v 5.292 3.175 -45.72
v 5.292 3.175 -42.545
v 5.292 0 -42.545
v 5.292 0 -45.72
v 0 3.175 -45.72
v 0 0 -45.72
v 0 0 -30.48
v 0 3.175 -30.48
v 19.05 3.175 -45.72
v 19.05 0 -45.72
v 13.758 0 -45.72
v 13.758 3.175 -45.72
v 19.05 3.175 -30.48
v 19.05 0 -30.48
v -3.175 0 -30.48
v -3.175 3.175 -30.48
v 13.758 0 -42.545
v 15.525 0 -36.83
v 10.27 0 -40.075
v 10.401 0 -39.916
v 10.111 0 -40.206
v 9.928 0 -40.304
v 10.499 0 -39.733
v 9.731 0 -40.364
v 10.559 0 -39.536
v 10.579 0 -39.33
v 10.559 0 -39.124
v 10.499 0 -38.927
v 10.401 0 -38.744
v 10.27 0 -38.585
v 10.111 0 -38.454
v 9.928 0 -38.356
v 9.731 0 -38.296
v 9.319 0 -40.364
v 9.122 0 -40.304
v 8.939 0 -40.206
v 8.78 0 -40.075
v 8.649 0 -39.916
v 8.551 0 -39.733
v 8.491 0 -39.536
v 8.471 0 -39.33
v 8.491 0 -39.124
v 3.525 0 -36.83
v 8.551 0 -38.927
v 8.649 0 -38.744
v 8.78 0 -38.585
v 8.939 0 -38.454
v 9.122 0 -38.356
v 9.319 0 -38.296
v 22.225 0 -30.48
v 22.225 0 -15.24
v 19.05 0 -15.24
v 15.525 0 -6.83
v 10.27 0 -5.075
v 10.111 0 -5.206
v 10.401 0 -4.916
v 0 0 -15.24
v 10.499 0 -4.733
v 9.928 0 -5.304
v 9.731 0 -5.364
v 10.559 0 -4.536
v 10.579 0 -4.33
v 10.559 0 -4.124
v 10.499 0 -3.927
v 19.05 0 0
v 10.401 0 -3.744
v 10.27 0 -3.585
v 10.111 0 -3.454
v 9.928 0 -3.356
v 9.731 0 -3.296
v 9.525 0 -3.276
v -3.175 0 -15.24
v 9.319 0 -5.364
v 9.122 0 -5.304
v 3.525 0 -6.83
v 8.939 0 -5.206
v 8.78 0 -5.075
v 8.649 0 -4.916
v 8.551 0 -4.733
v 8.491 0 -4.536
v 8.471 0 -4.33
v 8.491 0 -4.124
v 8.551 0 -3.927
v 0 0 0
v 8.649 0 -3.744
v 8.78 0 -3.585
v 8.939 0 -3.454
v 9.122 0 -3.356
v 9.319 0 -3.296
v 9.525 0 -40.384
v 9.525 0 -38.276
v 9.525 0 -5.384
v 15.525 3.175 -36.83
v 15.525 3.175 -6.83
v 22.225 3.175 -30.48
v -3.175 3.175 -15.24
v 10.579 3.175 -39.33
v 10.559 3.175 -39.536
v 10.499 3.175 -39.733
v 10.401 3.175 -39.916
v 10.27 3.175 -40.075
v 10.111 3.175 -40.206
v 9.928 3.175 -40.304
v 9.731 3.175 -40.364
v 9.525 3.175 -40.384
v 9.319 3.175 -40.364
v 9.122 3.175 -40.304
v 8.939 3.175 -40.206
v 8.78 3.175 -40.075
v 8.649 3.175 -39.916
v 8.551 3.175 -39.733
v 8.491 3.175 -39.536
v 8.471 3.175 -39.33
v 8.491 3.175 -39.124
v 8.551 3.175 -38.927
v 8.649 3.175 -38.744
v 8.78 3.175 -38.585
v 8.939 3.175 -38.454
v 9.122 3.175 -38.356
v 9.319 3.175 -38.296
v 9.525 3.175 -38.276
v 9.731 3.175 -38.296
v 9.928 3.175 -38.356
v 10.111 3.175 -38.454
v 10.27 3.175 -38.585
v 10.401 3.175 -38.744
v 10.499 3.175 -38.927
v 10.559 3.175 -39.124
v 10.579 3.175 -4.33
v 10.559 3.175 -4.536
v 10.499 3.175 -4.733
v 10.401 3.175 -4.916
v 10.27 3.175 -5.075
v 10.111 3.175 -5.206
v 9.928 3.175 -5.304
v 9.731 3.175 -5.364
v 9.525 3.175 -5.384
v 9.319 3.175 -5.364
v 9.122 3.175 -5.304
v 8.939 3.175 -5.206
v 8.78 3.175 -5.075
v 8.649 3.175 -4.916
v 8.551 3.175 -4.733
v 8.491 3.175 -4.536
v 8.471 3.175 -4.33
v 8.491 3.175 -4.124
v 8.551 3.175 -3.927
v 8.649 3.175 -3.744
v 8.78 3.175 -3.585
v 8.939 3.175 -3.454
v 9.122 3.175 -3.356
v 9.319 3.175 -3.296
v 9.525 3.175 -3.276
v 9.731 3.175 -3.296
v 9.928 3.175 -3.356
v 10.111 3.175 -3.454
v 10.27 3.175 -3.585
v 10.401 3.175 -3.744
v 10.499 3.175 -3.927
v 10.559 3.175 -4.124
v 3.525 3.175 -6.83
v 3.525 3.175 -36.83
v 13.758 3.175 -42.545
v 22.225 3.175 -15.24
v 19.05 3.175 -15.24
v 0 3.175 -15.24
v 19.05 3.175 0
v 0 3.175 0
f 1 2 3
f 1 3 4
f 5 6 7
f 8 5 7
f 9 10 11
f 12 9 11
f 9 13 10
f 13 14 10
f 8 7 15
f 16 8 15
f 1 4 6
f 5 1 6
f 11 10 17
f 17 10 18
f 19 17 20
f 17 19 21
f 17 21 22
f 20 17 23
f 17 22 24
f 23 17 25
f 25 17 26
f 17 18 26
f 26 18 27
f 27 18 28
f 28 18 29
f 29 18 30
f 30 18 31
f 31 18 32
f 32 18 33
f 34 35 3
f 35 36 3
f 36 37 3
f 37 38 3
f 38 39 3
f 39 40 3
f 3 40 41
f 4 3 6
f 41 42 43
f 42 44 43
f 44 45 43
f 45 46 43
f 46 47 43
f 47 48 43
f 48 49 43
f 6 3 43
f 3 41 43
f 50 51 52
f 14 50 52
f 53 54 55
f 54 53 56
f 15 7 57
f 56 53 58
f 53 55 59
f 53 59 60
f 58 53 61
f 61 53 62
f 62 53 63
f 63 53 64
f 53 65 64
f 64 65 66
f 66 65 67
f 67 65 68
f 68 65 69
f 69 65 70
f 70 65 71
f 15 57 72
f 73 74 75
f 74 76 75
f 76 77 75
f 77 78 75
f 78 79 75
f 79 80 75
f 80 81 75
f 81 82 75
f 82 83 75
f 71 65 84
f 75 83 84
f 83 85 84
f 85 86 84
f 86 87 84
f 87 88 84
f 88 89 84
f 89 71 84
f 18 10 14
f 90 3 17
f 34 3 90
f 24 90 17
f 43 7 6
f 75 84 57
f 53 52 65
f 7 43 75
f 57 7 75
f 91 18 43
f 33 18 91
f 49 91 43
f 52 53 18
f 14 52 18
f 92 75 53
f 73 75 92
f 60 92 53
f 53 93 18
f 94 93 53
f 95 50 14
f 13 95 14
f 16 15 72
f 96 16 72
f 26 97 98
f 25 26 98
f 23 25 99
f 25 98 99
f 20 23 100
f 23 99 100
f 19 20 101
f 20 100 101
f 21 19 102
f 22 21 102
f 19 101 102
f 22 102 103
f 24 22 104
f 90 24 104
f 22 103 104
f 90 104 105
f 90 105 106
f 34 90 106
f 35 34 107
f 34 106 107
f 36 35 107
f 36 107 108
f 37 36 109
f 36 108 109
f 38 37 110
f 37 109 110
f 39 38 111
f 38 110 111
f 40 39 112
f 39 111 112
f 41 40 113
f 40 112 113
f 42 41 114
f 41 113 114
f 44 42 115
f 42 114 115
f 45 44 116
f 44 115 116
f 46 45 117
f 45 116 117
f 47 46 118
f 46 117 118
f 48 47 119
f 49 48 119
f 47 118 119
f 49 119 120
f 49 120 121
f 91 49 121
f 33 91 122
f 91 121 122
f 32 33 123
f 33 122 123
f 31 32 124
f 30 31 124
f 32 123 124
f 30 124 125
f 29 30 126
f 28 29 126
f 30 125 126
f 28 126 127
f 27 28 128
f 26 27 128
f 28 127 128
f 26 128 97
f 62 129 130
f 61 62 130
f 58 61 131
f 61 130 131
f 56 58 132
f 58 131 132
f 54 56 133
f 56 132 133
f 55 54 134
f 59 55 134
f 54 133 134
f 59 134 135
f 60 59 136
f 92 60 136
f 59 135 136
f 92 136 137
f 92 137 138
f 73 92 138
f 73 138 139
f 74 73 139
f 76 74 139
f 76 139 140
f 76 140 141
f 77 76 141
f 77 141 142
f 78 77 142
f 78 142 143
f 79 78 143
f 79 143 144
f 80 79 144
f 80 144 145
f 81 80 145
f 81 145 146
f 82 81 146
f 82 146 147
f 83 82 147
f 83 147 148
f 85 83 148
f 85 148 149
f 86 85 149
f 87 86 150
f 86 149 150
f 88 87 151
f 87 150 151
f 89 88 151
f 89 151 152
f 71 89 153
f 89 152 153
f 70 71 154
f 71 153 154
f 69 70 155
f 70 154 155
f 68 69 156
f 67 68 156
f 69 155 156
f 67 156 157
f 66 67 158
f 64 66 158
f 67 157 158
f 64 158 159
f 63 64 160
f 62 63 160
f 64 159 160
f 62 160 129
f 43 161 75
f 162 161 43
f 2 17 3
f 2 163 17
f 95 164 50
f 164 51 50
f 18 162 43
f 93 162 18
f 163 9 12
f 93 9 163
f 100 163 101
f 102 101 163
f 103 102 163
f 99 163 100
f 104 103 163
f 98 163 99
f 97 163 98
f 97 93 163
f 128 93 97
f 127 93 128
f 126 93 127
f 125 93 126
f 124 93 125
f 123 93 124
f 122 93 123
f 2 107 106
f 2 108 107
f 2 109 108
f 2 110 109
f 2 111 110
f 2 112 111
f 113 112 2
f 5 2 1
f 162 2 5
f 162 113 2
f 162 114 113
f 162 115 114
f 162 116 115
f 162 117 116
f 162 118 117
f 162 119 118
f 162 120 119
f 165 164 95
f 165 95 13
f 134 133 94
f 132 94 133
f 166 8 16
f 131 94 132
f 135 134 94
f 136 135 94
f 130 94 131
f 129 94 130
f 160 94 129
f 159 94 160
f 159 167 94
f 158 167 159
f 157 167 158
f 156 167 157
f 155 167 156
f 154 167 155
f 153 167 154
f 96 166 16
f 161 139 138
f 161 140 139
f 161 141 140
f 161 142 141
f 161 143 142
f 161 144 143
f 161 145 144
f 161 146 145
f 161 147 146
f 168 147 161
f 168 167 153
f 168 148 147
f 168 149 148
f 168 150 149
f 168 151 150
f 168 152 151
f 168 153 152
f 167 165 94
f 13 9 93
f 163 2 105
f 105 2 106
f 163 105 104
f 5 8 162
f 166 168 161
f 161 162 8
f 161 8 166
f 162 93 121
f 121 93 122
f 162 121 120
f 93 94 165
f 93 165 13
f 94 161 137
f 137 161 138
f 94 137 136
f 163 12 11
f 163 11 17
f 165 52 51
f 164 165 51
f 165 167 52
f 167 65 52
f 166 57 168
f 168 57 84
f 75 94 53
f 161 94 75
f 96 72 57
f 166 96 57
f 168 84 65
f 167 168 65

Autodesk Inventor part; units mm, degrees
ref_plane "YZ Plane" through (0, 0, 0) normal (1, 0, 0) x (0, 1, 0)
ref_plane "XZ Plane" through (0, 0, 0) normal (0, 1, 0) x (-1, 0, 0)
ref_plane "XY Plane" through (0, 0, 0) normal (0, 0, 1) x (1, 0, 0)
sketch "Sketch1" plane through (0, 0, 0) normal (0, 1, 0) x (-1, 0, 0)
  line L0 (0, 0) -> (-19.05, 0)
  line L1 (-19.05, 0) -> (-19.05, -45.72)
  line L2 (-19.05, -45.72) -> (0, -45.72)
  line L3 (0, -45.72) -> (0, 0)
  line L4 (-19.05, -15.24) -> (-22.225, -15.24)
  line L5 (-22.225, -15.24) -> (-22.225, -30.48)
  line L6 (-22.225, -30.48) -> (-19.05, -30.48)
  line L7 (-19.05, -30.48) -> (-19.05, -15.24)
  line L8 (0, -30.48) -> (3.175, -30.48)
  line L9 (3.175, -30.48) -> (3.175, -15.24)
  line L10 (3.175, -15.24) -> (0, -15.24)
  line L11 (0, -15.24) -> (0, -30.48)
  dimension "d0" = 19.05
  dimension "d1" = 45.72
  dimension "d2" = 3.175
  dimension "d3" = 15.24
  dimension "d4" = 3.175
  dimension "d5" = 15.24
  dimension "d6" = 15.24
extrude "Extrusion1" add sketch "Sketch1" along normal blind 3.175
sketch "Sketch2" plane through (0, 3.175, 0) normal (0, 1, 0) x (1, 0, 0)
  line L0 (-3.175, 30.48) -> (-3.175, 15.24) projected
  line L1 (19.05, 45.72) -> (0, 45.72) projected
  line L2 (5.2917, 45.72) -> (13.7583, 45.72)
  line L3 (13.7583, 45.72) -> (13.7583, 42.545)
  line L4 (13.7583, 42.545) -> (5.2917, 42.545)
  line L5 (5.2917, 42.545) -> (5.2917, 45.72)
  dimension "d9" = 8.4667
  dimension "d10" = 3.175
  dimension "d11" = 8.4667
extrude "Extrusion2" cut sketch "Sketch2" against normal blind 3.175
sketch "Sketch3" plane through (0, 3.175, 0) normal (0, 1, 0) x (1, 0, 0)
  line L0 (-3.175, 30.48) -> (-3.175, 15.24) projected
  line L1 (19.05, 45.72) -> (13.7583, 45.72) projected
  line L2 (3.525, 36.83) -> (15.525, 36.83)
  line L3 (15.525, 36.83) -> (15.525, 6.83)
  line L4 (15.525, 6.83) -> (3.525, 6.83)
  line L5 (3.525, 6.83) -> (3.525, 36.83)
  circle A0 centre (9.525, 4.33) radius 1.0541
  circle A1 centre (9.525, 39.33) radius 1.0541
  dimension "d14" = 12
  dimension "d15" = 30
  dimension "d16" = 6.7
  dimension "d17" = 8.89
  dimension "d18" = 2.1082
  dimension "d19" = 2.5
  dimension "d20" = 2.1082
  dimension "d21" = 2.5
  dimension "d22" = 6
  dimension "d23" = 6
extrude "Extrusion3" cut sketch "Sketch3" against normal blind 3.175
equation "\"d0\" = angleDepth - 2 * thick"
equation "\"d1\" = angleLength"
equation "\"d2\" = thick"
equation "\"d3\" = 0.333333 * angleLength"
equation "\"d4\" = thick"
equation "\"d5\" = 0.333333 * angleLength"
equation "\"d6\" = 0.333333 * angleLength"
equation "\"d7\" = thick"
equation "\"d9\" = 0.333333 * angleDepth"
equation "\"d10\" = thick"
equation "\"d11\" = 0.333333 * angleDepth"
equation "\"d12\" = thick"
equation "\"d14\" = servoWidth"
equation "\"d15\" = servoLength"
equation "\"d16\" = -0.5 * servoWidth + 0.5 * angleDepth"
equation "\"d17\" = servoOff"
equation "\"d18\" = servoHole"
equation "\"d19\" = -0.5 * servoLength + 0.5 * servoDist"
equation "\"d20\" = servoHole"
equation "\"d21\" = -0.5 * servoLength + 0.5 * servoDist"
equation "\"d22\" = 0.5 * servoWidth"
equation "\"d23\" = 0.5 * servoWidth"
equation "\"d24\" = thick"
equation "\"angleDepth\" = 25.4"
equation "\"thick\" = 3.175"
equation "\"angleLength\" = 45.72"
equation "\"servoLength\" = 30"
equation "\"servoWidth\" = 12"
equation "\"servoDist\" = 35"
equation "\"servoOff\" = 8.89"
equation "\"servoHole\" = 2.1082"
properties part number "AngleTop"
